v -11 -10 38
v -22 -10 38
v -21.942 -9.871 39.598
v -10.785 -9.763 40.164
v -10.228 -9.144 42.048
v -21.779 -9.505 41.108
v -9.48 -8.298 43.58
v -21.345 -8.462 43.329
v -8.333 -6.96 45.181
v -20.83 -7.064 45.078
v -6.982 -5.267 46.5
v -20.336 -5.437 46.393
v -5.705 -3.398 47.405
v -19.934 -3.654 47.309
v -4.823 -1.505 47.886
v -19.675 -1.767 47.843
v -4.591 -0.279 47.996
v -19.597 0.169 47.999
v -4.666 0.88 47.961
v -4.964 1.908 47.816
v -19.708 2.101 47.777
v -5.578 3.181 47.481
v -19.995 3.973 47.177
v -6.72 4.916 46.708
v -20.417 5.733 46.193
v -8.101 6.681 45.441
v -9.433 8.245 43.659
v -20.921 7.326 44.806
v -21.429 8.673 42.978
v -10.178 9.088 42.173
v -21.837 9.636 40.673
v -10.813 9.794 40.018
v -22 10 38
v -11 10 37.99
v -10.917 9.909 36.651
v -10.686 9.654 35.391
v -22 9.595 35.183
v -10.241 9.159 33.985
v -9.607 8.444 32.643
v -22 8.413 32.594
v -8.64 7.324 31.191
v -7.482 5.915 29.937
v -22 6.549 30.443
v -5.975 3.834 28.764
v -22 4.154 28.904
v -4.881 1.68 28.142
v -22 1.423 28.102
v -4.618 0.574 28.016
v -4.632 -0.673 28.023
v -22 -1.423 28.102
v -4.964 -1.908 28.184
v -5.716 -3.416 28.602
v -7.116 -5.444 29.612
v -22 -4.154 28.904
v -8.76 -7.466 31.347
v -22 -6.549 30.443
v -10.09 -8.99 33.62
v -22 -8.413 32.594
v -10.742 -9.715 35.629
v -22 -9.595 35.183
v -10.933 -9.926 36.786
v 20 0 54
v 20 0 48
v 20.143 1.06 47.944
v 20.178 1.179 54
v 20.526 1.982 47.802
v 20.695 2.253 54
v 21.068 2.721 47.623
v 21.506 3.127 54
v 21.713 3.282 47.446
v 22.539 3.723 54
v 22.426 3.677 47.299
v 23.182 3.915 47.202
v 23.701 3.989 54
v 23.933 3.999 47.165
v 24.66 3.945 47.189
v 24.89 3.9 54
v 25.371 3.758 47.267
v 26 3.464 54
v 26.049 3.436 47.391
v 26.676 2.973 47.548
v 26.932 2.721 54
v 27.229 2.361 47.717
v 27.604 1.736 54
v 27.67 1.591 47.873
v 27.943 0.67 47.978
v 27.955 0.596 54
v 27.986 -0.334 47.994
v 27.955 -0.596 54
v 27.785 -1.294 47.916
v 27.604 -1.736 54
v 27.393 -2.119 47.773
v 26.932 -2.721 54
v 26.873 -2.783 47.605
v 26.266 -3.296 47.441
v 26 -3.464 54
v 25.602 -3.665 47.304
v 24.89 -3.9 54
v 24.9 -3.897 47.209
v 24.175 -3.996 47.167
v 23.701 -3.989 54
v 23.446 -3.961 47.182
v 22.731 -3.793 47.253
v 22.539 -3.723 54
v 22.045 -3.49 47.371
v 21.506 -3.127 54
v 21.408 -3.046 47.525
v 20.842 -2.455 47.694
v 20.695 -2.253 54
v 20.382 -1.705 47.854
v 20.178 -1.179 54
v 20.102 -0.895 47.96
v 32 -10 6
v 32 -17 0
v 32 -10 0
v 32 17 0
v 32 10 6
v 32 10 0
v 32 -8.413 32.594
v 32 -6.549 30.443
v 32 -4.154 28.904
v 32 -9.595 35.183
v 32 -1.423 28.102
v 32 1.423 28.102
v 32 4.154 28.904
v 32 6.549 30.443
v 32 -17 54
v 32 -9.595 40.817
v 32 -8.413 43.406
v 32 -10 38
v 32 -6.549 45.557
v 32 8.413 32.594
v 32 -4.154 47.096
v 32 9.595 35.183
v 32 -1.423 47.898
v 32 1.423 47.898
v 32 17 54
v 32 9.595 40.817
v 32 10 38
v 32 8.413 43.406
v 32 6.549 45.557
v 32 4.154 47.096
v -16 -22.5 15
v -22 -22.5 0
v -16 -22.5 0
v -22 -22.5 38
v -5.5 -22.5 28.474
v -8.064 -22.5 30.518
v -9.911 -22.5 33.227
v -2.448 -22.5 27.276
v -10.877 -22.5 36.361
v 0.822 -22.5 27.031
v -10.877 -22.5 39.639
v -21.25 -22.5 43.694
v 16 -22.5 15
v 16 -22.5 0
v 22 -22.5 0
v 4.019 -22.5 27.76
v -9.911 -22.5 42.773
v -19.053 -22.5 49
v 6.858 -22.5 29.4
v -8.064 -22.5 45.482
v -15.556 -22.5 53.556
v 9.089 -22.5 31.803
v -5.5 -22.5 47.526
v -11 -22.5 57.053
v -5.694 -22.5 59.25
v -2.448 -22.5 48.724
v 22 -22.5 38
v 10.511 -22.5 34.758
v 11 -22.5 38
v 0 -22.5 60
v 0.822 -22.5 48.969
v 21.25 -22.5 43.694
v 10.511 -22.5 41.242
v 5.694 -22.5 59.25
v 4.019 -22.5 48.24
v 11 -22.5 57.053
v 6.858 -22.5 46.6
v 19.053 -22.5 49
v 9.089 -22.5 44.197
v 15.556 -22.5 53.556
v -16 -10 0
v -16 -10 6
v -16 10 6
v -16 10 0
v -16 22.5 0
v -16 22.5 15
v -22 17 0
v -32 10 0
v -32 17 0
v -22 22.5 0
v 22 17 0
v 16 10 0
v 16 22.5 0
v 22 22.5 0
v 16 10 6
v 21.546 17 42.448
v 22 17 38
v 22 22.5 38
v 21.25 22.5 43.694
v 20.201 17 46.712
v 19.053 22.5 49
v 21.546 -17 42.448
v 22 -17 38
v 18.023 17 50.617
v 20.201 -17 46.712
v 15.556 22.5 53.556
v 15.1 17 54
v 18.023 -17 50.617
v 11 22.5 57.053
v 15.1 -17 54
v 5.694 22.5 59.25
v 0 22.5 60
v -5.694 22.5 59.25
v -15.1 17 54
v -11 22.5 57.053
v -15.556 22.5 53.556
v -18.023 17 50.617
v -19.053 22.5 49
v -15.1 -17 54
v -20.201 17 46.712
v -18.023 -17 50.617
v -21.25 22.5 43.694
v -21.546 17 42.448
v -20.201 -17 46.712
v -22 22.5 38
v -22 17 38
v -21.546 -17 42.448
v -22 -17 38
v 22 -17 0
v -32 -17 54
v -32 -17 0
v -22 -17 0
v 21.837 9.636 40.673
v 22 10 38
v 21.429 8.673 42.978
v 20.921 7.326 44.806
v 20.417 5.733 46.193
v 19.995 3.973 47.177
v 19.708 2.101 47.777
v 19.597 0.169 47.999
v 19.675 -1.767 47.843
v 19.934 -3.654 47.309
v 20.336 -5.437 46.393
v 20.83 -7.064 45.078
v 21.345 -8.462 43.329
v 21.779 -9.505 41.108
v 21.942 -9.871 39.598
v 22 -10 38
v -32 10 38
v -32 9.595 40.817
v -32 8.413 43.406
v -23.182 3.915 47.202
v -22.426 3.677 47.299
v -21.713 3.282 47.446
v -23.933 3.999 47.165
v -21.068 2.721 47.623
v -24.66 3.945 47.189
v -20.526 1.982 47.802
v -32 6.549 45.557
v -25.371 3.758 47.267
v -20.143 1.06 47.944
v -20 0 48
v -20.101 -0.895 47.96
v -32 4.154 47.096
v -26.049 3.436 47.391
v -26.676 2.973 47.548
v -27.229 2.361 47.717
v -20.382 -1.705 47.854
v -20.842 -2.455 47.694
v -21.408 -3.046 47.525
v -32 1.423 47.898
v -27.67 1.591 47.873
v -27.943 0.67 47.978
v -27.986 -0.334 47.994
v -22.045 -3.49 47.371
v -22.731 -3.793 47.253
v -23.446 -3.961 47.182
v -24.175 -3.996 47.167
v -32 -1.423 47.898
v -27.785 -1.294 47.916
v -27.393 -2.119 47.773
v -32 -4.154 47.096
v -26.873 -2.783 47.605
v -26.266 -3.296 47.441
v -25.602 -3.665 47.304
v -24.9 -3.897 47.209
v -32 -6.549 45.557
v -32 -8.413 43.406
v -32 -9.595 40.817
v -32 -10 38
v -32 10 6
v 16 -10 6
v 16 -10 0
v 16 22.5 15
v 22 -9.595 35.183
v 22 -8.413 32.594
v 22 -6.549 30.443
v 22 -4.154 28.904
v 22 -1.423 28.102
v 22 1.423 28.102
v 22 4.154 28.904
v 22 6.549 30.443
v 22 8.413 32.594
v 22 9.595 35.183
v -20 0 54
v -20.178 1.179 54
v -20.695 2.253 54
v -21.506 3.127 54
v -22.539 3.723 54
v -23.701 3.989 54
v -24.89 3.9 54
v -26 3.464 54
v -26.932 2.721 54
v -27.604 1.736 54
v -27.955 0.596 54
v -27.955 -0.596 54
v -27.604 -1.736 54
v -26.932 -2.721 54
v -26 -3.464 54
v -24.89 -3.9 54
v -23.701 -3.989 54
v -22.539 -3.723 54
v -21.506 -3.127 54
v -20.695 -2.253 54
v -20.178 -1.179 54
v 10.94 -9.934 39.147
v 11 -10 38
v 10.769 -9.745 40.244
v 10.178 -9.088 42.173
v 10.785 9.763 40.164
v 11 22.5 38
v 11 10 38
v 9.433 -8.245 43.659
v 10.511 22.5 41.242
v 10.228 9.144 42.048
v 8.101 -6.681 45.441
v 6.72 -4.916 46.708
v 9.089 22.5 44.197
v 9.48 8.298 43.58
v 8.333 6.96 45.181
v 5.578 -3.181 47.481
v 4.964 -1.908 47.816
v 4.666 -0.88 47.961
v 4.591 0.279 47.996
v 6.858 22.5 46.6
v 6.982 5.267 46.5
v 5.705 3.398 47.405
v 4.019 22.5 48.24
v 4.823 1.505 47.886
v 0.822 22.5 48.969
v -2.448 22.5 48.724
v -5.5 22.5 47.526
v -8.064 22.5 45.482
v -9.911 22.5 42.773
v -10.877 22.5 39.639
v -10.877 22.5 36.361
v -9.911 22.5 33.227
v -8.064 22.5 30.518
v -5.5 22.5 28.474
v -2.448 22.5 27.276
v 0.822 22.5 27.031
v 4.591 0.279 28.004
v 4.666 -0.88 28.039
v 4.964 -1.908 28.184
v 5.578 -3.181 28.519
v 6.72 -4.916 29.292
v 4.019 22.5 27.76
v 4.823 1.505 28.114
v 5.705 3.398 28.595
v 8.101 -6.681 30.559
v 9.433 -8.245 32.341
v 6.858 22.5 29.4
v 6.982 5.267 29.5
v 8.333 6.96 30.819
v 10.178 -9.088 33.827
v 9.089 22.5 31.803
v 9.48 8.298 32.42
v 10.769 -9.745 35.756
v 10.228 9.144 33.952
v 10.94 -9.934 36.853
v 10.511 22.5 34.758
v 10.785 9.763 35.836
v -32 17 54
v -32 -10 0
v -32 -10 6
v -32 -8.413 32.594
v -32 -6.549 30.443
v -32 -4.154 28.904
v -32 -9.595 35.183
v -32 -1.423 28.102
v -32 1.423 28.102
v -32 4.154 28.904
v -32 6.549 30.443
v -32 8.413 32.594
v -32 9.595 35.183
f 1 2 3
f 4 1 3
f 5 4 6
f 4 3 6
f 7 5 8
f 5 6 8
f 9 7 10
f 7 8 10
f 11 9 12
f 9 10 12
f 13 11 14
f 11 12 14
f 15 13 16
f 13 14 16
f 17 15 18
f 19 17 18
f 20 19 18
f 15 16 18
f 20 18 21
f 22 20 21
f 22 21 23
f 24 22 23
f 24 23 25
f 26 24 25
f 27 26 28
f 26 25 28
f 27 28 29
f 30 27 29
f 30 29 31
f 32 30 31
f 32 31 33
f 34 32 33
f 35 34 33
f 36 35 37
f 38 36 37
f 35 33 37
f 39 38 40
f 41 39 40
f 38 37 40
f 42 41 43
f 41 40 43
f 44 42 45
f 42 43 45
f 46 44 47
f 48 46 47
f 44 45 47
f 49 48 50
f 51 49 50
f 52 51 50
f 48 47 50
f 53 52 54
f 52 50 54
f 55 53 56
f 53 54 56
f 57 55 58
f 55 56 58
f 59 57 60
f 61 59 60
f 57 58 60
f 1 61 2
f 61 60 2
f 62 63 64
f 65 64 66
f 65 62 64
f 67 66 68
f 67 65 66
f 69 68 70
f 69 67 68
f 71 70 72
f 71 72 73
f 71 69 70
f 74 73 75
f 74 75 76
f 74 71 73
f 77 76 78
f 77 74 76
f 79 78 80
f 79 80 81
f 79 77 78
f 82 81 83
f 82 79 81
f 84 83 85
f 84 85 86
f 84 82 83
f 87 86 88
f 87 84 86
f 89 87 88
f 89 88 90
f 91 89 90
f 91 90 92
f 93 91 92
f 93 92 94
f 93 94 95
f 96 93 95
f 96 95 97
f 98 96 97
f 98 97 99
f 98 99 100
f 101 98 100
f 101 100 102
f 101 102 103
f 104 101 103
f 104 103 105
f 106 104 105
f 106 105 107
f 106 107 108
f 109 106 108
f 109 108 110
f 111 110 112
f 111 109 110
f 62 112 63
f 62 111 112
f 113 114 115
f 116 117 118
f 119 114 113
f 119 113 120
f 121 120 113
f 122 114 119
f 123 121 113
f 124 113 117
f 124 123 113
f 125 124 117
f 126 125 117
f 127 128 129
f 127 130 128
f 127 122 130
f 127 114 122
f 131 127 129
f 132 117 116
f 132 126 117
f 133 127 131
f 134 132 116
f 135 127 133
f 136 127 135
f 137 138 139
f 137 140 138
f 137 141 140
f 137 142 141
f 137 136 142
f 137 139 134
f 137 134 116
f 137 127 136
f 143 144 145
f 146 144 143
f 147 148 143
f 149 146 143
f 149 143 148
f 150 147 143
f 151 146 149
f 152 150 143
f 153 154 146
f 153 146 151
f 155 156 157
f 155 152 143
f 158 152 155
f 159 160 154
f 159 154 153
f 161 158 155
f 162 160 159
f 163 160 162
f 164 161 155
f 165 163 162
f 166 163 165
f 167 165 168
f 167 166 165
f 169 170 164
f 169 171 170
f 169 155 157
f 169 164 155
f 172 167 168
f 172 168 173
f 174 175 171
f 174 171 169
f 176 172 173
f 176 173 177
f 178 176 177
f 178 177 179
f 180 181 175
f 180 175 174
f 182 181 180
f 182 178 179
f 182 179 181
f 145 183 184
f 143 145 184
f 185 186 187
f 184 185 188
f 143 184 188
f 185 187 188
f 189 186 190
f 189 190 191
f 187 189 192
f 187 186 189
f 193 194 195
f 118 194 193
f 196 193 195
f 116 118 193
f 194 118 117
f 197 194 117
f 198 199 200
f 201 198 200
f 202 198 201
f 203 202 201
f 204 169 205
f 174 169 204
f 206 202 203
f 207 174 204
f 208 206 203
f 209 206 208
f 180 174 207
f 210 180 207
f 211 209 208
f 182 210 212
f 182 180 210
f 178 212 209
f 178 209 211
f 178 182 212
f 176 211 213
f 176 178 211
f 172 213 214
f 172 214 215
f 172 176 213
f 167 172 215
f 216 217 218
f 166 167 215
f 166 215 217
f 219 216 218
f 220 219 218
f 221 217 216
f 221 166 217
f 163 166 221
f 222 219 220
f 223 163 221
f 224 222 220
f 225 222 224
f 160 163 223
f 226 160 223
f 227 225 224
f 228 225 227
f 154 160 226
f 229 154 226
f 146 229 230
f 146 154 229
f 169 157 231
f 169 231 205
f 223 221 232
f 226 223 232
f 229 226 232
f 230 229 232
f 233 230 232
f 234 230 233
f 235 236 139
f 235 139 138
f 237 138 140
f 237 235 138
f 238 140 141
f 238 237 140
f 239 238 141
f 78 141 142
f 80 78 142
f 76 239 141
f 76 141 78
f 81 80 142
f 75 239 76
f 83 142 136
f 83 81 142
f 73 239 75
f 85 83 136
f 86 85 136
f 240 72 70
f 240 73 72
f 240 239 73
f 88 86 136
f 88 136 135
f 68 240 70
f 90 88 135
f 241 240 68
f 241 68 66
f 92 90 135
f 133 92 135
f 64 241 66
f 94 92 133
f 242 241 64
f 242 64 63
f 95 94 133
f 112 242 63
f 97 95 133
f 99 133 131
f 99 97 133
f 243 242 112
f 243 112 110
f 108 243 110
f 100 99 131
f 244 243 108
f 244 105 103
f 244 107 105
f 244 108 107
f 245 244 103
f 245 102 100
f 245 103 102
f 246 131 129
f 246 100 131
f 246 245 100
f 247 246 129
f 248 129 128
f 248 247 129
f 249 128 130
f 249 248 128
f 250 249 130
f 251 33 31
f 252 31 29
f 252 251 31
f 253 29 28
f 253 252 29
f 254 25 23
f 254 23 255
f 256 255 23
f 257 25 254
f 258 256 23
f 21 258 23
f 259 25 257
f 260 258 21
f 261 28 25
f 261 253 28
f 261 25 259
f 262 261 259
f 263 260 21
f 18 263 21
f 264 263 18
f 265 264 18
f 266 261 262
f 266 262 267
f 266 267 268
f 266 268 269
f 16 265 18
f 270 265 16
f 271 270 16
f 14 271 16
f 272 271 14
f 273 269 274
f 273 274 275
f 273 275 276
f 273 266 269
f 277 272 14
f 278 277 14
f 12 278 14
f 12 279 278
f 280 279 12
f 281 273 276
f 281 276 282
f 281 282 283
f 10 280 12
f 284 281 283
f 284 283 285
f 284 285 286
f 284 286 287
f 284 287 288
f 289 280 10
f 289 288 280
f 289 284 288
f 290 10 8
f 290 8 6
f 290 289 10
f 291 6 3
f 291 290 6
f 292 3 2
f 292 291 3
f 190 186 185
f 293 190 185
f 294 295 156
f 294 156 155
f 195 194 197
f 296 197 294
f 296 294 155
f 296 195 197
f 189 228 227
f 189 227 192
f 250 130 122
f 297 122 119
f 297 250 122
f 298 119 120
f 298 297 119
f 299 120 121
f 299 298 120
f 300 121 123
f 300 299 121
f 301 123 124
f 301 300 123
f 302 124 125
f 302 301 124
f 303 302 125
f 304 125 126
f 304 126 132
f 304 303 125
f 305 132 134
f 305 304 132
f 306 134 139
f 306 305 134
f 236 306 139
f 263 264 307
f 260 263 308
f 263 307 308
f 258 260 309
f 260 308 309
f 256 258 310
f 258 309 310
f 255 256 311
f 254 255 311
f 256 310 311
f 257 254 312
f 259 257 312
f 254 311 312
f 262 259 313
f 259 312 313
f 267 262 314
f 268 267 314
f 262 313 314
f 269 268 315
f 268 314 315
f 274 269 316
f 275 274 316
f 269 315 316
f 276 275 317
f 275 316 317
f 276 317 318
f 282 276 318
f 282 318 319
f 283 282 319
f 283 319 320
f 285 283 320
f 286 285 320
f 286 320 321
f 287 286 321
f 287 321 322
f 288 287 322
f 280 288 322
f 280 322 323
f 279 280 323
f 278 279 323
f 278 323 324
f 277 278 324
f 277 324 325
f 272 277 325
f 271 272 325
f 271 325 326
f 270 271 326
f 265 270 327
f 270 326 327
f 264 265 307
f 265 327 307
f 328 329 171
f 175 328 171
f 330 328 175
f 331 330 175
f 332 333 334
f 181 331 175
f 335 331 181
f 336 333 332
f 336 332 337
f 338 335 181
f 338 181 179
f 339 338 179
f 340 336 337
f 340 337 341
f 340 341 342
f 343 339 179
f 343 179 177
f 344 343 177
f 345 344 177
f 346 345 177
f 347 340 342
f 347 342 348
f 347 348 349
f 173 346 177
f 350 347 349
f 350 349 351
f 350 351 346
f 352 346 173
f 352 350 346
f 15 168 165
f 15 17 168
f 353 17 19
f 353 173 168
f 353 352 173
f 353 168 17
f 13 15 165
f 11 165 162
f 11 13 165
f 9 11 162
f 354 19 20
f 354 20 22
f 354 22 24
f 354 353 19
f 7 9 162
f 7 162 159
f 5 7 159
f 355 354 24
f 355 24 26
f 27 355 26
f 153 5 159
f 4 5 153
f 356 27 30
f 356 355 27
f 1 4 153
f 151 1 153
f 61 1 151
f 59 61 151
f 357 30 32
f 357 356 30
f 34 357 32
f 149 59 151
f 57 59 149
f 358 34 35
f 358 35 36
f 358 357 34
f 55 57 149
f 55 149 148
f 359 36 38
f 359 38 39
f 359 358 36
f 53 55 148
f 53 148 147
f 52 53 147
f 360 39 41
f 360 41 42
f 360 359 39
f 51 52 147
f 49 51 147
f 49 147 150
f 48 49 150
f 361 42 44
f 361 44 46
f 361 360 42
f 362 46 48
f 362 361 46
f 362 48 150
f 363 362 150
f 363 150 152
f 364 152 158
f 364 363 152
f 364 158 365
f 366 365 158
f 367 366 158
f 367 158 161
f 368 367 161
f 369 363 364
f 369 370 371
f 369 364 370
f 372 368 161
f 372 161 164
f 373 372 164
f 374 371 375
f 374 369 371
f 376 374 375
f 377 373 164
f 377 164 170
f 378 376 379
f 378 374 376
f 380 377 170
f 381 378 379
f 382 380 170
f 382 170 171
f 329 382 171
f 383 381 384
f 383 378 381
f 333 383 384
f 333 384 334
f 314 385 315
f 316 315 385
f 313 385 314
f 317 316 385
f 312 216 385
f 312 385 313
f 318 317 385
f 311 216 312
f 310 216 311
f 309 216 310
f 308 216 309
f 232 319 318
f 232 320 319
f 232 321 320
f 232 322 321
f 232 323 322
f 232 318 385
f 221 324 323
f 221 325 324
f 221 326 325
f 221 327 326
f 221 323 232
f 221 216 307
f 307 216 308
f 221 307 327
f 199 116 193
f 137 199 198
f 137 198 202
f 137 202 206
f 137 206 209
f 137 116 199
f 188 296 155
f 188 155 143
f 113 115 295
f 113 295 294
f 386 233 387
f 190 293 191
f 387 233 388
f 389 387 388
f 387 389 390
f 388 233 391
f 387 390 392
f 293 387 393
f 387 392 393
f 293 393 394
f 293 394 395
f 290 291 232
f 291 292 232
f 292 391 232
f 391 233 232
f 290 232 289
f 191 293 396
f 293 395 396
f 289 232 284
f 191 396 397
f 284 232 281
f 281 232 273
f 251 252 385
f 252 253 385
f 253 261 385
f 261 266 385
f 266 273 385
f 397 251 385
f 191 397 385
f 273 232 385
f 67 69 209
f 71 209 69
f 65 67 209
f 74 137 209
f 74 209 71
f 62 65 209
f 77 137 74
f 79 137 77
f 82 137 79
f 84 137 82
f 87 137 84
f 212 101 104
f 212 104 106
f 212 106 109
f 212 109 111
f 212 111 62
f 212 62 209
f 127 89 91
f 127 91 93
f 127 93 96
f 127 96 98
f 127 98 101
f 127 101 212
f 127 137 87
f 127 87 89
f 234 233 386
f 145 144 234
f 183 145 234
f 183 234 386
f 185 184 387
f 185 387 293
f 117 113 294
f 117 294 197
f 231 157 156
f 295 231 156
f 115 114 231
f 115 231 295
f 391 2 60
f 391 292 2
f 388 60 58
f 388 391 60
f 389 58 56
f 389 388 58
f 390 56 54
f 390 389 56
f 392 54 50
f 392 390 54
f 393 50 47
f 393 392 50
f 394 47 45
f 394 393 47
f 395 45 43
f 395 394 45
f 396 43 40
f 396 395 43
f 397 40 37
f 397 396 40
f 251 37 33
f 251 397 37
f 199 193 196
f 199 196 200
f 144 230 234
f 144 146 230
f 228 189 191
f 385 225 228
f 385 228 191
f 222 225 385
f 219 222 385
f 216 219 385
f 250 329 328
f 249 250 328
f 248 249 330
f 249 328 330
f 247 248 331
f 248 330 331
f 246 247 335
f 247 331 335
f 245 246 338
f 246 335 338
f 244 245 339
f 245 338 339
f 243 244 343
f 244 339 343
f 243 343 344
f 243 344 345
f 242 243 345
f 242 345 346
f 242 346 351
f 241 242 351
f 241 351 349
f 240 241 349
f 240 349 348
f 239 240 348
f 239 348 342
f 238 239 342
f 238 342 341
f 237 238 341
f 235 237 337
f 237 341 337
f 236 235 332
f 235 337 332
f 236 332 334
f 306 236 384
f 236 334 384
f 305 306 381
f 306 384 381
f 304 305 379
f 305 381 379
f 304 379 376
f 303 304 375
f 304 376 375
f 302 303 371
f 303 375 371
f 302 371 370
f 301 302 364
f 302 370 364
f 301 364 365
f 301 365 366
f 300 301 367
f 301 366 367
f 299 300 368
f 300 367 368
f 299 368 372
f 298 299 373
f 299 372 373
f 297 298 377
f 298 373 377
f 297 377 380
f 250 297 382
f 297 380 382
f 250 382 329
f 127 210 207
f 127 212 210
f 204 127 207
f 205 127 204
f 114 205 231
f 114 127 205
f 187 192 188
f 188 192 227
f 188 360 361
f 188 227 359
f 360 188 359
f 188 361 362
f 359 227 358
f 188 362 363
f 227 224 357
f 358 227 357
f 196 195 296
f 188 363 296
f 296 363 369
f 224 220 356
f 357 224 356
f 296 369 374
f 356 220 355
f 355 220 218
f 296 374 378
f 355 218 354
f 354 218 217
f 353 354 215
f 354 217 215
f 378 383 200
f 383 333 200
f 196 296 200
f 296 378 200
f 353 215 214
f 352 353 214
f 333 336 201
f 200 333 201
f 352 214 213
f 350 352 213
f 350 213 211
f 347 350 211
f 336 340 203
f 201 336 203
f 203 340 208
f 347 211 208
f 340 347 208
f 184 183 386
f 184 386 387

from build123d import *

# Parameters (mm, degrees)
F0_R      = 11
F0_W      = 32
F0_H      = 15
F1_DEPTH  = 22.5
F2_R      = 10
F2_W      = 20
F2_H      = 6
F3_DEPTH  = 32
F4_R      = 11
F5_DEPTH  = 45.001
F6_R      = 10
F7_DEPTH  = 64.0010001
F8_W      = 20
F8_H      = 6
F9_DEPTH  = 64.0010001
F10_W     = 32
F10_H     = 15
F11_DEPTH = 45.001
F12_R     = 4
F13_DEPTH = 15


# Not quite as in the source:
# - a pattern or mirror of a feature is missing from the dataset's text; its kind, count and spacing are read off the source's solid


with BuildPart() as f1:
    # F0 (on Front) → F1 (new body, symmetric)
    with BuildSketch(Plane.XZ):
        with BuildLine():
            Line((-22, 38), (-22, 0))
            Line((-22, 0), (-16, 0))
            Line((-16, 0), (-16, 15))
            Line((-16, 15), (16, 15))
            Line((16, 15), (16, 0))
            Line((16, 0), (22, 0))
            Line((22, 0), (22, 38))
            ThreePointArc((22, 38), (0, 60), (-22, 38))
        make_face()
        with Locations((0, 38)):
            Circle(F0_R, mode=Mode.SUBTRACT)
        with Locations((0, 7.5)):
            Rectangle(F0_W, F0_H)
    extrude(amount=F1_DEPTH, both=True)

    # F2 (on Right) → F3 (join, symmetric)
    with BuildSketch(Plane.YZ):
        Polygon((17, 0), (17, 54), (-17, 54), (-17, 0), (-10, 0), (-10, 6), (10, 6), (10, 0), align=None)
        with Locations((0, 38)):
            Circle(F2_R, mode=Mode.SUBTRACT)
        with Locations((0, 3)):
            Rectangle(F2_W, F2_H)
    extrude(amount=F3_DEPTH, both=True)

    # F4 (on face) → F5 (cut, through all)
    with BuildSketch(Plane.XZ.offset(22.5)):
        with Locations((0, 38)):
            Circle(F4_R)
    extrude(amount=-F5_DEPTH, mode=Mode.SUBTRACT)

    # F6 (on face) → F7 (cut, through all)
    with BuildSketch(Plane(origin=(-32, 0, 0), x_dir=(0, -1, 0), z_dir=(-1, 0, 0))):
        with Locations((0, 38)):
            Circle(F6_R)
    extrude(amount=-F7_DEPTH, mode=Mode.SUBTRACT)

    # F8 (on face) → F9 (cut, through all)
    with BuildSketch(Plane.YZ.offset(32)):
        with Locations((0, 3)):
            Rectangle(F8_W, F8_H)
    extrude(amount=-F9_DEPTH, mode=Mode.SUBTRACT)

    # F10 (on face) → F11 (cut, through all)
    with BuildSketch(Plane(origin=(0, 22.5, 0), x_dir=(-1, 0, 0), z_dir=(0, 1, 0))):
        with Locations((0, 7.5)):
            Rectangle(F10_W, F10_H)
    extrude(amount=-F11_DEPTH, mode=Mode.SUBTRACT)

    # F12 (on face) → F13 (cut)
    with BuildSketch(Plane.XY.offset(54)):
        with Locations((-24, 0)):
            Circle(F12_R)
    f13 = extrude(amount=-F13_DEPTH, mode=Mode.SUBTRACT)

    # F13_copies: F13 across plane
    add(f13.mirror(Plane(origin=(2.7e-05, 0, 0), x_dir=(0, 0, 1), z_dir=(1, 0, 0))), mode=Mode.SUBTRACT)


solid = f1.part
